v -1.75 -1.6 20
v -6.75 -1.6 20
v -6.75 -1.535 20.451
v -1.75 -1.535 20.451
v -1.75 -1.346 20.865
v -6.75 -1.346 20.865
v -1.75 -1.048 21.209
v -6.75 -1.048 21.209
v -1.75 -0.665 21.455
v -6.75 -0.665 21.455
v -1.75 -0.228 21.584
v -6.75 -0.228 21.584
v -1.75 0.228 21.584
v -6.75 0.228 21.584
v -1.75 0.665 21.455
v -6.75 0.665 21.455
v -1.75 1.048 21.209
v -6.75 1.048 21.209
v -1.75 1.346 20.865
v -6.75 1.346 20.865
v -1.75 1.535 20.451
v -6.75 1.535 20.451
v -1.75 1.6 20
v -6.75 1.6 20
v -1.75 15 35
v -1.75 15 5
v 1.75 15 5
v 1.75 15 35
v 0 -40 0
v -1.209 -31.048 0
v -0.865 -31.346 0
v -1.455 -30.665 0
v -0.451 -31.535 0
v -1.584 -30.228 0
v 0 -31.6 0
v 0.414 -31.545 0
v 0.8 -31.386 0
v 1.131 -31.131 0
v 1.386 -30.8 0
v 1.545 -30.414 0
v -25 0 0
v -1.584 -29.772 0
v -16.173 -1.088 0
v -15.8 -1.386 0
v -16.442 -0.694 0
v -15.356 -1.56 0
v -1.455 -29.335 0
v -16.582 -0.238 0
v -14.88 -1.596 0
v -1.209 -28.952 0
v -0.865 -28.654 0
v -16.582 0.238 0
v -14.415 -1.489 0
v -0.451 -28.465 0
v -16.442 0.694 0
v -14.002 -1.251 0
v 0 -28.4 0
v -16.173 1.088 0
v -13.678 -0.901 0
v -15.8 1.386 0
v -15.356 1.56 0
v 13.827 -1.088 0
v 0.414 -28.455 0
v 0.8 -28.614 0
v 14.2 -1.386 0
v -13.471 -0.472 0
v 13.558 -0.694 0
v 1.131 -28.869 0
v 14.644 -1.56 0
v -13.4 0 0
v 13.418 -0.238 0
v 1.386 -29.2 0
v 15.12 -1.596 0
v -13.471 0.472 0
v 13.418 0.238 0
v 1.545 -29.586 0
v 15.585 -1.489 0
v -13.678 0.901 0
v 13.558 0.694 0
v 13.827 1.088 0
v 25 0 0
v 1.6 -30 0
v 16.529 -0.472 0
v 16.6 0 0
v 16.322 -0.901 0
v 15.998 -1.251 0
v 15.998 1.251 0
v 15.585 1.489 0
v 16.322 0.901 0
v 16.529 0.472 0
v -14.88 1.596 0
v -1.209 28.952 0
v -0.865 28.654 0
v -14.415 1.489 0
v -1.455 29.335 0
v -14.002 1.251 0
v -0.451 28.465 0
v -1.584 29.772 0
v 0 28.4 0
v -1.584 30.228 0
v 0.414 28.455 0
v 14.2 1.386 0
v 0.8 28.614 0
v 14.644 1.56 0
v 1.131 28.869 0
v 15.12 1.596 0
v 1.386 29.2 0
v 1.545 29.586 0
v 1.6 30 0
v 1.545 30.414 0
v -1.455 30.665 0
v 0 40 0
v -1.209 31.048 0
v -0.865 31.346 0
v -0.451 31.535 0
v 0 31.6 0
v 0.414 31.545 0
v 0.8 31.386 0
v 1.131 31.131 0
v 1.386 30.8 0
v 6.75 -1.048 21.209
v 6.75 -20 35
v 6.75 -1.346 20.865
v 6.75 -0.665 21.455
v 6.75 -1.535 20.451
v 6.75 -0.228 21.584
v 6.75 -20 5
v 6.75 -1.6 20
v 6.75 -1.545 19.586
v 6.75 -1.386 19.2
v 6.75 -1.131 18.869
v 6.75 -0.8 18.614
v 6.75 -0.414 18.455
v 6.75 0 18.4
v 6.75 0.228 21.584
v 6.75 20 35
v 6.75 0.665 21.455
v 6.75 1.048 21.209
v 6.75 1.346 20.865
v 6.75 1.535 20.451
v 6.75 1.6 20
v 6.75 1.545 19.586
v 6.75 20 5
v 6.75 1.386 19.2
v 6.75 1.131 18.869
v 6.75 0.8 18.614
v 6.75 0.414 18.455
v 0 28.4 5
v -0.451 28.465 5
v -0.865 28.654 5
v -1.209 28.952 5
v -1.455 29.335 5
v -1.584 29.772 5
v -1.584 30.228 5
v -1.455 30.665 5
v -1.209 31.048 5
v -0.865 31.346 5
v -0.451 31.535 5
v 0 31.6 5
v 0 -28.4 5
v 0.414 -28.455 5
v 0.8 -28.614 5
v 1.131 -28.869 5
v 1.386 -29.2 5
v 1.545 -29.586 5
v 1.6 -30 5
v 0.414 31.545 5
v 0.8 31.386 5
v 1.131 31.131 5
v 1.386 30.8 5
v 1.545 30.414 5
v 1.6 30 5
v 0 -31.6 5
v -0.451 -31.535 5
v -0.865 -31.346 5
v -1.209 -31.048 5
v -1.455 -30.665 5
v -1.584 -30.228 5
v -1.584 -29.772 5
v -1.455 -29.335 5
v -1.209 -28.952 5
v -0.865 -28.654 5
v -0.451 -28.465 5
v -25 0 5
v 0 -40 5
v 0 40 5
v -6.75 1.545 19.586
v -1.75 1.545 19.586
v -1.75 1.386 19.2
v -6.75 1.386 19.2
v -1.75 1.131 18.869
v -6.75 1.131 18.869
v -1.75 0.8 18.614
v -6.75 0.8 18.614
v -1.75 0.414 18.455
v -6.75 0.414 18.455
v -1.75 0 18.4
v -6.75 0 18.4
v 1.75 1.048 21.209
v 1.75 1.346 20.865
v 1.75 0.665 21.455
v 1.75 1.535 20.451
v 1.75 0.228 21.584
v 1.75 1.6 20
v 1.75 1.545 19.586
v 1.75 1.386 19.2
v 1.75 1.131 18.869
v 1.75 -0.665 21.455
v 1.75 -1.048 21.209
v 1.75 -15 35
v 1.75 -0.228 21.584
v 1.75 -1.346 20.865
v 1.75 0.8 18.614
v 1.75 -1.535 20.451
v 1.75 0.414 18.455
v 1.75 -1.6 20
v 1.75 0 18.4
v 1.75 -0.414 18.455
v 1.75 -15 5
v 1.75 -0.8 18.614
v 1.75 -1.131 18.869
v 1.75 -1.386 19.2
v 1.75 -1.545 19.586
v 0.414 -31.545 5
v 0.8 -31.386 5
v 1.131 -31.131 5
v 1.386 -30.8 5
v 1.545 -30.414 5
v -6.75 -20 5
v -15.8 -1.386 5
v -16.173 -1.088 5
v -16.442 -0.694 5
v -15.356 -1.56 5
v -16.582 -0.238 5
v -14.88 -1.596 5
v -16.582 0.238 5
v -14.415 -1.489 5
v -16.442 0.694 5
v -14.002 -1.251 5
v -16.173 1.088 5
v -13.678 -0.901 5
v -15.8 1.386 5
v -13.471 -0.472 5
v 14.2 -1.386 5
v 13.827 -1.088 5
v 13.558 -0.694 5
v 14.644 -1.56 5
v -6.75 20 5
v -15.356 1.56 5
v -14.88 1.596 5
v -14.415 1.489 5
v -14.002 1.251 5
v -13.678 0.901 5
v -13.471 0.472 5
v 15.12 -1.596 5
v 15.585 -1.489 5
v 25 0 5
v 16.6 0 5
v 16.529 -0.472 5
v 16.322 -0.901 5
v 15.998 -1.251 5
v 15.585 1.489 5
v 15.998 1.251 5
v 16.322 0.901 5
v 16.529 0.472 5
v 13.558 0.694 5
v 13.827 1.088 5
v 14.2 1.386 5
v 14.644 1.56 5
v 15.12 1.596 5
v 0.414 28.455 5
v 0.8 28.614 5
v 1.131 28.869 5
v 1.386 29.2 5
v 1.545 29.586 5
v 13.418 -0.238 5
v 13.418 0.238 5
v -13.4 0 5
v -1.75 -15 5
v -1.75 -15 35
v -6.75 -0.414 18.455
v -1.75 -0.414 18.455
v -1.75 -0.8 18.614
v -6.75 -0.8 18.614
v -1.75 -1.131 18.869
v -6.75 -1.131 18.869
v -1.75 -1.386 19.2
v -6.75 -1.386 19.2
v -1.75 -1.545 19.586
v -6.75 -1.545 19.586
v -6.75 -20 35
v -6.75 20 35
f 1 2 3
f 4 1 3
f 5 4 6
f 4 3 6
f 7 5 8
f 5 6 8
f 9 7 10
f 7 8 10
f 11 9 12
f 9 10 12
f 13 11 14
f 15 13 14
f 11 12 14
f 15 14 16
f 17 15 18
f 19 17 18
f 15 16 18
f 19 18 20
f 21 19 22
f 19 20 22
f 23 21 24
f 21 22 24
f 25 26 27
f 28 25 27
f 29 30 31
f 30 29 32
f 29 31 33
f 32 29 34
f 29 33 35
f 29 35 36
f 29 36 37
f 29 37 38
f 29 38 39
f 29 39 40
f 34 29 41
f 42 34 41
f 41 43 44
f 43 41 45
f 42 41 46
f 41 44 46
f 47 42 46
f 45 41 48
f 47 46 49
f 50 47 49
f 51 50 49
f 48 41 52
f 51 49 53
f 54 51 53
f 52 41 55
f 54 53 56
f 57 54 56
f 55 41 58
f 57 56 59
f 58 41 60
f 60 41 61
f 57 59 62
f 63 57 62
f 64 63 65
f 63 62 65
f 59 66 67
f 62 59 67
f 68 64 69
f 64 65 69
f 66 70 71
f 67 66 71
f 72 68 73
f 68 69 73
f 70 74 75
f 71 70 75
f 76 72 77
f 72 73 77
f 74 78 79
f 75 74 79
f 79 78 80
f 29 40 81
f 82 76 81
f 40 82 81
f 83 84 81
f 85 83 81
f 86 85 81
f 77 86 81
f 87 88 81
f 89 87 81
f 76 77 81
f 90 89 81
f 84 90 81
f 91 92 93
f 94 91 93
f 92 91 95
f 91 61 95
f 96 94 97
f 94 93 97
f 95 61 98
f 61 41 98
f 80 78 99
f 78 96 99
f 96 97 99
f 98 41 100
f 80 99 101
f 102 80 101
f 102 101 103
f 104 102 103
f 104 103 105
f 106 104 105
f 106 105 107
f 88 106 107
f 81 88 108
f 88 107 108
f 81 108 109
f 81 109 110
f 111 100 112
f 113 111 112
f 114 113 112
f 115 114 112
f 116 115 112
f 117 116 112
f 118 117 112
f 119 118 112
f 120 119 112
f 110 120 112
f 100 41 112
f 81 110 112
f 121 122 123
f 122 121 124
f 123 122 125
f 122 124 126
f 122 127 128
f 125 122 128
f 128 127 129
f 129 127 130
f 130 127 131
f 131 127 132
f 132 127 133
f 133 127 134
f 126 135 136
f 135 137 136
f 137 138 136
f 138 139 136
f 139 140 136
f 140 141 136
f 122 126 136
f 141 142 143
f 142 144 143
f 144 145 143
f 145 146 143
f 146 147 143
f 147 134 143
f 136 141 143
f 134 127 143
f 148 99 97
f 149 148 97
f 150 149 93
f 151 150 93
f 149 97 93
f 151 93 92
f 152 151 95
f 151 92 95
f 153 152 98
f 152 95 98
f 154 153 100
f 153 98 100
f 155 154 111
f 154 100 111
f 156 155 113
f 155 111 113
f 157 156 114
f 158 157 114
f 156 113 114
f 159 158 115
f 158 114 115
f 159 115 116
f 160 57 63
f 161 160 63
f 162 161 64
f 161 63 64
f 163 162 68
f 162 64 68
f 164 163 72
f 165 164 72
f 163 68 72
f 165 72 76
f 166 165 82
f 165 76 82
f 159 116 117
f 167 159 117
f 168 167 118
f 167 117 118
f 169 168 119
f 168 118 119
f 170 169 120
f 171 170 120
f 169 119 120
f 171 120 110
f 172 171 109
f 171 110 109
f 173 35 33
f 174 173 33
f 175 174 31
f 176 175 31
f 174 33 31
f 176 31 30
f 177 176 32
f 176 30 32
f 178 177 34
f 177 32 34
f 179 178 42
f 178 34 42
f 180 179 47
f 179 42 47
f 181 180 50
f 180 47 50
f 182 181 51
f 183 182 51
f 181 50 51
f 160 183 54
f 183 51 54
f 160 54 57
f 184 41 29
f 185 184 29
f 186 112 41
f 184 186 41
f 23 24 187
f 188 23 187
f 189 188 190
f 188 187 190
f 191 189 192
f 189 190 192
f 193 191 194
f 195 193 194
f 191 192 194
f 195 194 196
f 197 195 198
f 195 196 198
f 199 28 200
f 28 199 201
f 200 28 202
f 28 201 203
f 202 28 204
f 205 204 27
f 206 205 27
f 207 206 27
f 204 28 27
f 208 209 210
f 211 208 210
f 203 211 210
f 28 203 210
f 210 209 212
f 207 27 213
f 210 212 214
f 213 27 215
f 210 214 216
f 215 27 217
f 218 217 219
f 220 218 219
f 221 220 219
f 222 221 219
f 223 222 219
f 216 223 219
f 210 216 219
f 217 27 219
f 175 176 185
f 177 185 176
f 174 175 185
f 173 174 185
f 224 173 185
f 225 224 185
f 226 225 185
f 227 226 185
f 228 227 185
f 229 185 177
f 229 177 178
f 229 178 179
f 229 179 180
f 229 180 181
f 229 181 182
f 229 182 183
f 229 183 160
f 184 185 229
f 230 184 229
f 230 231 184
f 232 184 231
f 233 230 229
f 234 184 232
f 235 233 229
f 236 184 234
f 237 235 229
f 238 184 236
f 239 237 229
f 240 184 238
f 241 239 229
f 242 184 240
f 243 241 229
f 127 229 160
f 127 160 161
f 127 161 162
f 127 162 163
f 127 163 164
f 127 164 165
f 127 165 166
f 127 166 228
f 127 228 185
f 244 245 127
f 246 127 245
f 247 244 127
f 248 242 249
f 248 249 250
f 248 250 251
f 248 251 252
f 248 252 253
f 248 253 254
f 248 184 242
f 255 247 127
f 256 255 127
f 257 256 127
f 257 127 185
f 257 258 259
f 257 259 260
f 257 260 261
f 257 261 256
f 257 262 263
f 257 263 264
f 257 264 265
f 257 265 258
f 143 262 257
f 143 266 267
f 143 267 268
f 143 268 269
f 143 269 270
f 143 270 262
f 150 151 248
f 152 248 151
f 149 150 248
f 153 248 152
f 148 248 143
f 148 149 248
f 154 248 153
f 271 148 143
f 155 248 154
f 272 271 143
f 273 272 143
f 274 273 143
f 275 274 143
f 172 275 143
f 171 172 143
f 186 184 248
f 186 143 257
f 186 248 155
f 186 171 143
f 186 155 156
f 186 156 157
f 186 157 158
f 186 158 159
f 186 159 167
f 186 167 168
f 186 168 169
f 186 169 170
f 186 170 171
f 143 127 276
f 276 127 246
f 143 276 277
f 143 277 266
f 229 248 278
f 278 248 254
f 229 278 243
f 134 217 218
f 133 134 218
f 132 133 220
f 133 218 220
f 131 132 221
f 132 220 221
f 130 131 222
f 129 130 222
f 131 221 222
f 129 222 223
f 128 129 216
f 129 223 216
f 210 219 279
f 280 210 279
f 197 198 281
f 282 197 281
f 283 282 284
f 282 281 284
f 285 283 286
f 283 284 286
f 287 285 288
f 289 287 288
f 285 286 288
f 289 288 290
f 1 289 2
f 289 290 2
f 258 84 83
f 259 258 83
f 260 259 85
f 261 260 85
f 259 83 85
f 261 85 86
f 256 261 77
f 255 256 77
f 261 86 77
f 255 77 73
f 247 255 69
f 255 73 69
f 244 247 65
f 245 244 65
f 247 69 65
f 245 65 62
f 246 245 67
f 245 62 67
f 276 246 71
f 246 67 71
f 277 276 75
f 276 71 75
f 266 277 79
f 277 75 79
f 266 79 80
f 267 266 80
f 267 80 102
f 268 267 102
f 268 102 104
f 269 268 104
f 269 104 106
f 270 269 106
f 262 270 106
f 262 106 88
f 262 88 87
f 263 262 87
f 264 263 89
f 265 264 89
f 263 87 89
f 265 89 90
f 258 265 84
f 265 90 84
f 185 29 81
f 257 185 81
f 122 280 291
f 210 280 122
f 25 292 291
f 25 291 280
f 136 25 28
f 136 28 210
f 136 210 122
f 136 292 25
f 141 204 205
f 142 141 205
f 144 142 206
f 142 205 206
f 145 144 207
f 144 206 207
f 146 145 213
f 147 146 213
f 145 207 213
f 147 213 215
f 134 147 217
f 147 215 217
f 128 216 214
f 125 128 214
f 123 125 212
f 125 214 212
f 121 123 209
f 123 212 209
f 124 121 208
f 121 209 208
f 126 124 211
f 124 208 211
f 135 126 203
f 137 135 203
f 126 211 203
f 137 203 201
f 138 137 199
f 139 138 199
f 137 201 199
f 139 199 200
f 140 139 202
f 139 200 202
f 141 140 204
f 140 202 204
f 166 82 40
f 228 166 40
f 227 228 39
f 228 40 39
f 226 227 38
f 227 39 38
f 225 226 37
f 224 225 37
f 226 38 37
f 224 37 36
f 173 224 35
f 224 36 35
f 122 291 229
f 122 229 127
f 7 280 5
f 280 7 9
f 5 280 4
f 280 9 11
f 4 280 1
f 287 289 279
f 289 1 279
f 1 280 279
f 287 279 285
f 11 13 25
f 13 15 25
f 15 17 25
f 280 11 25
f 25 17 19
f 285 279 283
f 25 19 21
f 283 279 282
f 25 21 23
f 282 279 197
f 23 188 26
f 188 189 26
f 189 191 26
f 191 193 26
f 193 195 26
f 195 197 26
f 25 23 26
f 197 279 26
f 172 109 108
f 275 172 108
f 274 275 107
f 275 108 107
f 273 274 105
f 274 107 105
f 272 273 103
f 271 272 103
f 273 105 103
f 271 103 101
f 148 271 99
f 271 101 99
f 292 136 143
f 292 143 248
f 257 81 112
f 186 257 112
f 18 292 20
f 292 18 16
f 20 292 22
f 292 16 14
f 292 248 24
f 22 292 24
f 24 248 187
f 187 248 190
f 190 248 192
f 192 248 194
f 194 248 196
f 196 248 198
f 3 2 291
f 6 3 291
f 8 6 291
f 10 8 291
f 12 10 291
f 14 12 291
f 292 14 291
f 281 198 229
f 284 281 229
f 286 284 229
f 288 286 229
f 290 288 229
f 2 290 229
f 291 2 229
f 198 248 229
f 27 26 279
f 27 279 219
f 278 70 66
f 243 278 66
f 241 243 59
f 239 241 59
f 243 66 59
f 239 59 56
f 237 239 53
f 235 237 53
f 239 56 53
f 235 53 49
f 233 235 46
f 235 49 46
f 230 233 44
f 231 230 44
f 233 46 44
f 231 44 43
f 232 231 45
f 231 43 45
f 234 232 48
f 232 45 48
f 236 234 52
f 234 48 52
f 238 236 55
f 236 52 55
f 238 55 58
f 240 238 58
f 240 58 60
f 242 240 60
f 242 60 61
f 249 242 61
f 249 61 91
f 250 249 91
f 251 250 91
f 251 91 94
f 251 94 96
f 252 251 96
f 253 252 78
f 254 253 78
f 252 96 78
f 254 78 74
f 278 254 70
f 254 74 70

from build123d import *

# Parameters (mm, degrees)
F1_DEPTH = 5
F3_DEPTH = 30
F5_DEPTH = 31.751


with BuildPart() as f1:
    # F0 (on Top) → F1 (new body)
    with BuildSketch(Plane.XY):
        with BuildLine():
            ThreePointArc((-16.6, 0), (-15, 1.6), (-13.4, 0))
            Line((-13.4, 0), (0, 0))
            Line((0, 0), (0, 28.4))
            ThreePointArc((0, 28.4), (-1.6, 30), (0, 31.6))
            Line((0, 31.6), (0, 40))
            Line((0, 40), (-25, 0))
            Line((-25, 0), (-16.6, 0))
        make_face()
        with BuildLine():
            Line((0, 0), (-13.4, 0))
            ThreePointArc((-13.4, 0), (-15, -1.6), (-16.6, 0))
            Line((-16.6, 0), (-25, 0))
            Line((-25, 0), (0, -40))
            Line((0, -40), (0, -31.6))
            ThreePointArc((0, -31.6), (-1.6, -30), (0, -28.4))
            Line((0, -28.4), (0, 0))
        make_face()
        with BuildLine():
            Line((0, 28.4), (0, 0))
            Line((0, 0), (13.4, 0))
            ThreePointArc((13.4, 0), (15, 1.6), (16.6, 0))
            Line((16.6, 0), (25, 0))
            Line((25, 0), (0, 40))
            Line((0, 40), (0, 31.6))
            ThreePointArc((0, 31.6), (1.131371, 31.131371), (1.6, 30))
            ThreePointArc((1.6, 30), (1.131371, 28.868629), (0, 28.4))
        make_face()
        with BuildLine():
            Line((13.4, 0), (0, 0))
            Line((0, 0), (0, -28.4))
            ThreePointArc((0, -28.4), (1.131371, -28.868629), (1.6, -30))
            ThreePointArc((1.6, -30), (1.131371, -31.131371), (0, -31.6))
            Line((0, -31.6), (0, -40))
            Line((0, -40), (25, 0))
            Line((25, 0), (16.6, 0))
            ThreePointArc((16.6, 0), (15, -1.6), (13.4, 0))
        make_face()
    extrude(amount=F1_DEPTH)

    # F2 (on face) → F3 (join)
    with BuildSketch(Plane.XY.offset(5)):
        Polygon((6.75, 20), (0, 20), (0, 15), (1.75, 15), (1.75, 0), (6.75, 0), align=None)
        Polygon((0, 15), (0, 20), (-6.75, 20), (-6.75, 0), (-1.75, 0), (-1.75, 15), align=None)
        Polygon((6.75, -20), (6.75, 0), (1.75, 0), (1.75, -15), (0, -15), (0, -20), align=None)
        Polygon((-1.75, 0), (-6.75, 0), (-6.75, -20), (0, -20), (0, -15), (-1.75, -15), align=None)
    extrude(amount=F3_DEPTH)

    # F4 (on face) → F5 (cut, through all)
    with BuildSketch(Plane(origin=(-6.75, 0, 0), x_dir=(0, -1, 0), z_dir=(-1, 0, 0))):
        with BuildLine():
            ThreePointArc((-1.6, 20), (-1.131371, 18.868629), (0, 18.4))
            Line((0, 18.4), (0, 20))
            Line((0, 20), (-1.6, 20))
        make_face()
        with BuildLine():
            Line((0, 20), (0, 18.4))
            ThreePointArc((0, 18.4), (1.131371, 18.868629), (1.6, 20))
            ThreePointArc((1.6, 20), (0, 21.6), (-1.6, 20))
            Line((-1.6, 20), (0, 20))
        make_face()
    extrude(amount=-F5_DEPTH, mode=Mode.SUBTRACT)


solid = f1.part
